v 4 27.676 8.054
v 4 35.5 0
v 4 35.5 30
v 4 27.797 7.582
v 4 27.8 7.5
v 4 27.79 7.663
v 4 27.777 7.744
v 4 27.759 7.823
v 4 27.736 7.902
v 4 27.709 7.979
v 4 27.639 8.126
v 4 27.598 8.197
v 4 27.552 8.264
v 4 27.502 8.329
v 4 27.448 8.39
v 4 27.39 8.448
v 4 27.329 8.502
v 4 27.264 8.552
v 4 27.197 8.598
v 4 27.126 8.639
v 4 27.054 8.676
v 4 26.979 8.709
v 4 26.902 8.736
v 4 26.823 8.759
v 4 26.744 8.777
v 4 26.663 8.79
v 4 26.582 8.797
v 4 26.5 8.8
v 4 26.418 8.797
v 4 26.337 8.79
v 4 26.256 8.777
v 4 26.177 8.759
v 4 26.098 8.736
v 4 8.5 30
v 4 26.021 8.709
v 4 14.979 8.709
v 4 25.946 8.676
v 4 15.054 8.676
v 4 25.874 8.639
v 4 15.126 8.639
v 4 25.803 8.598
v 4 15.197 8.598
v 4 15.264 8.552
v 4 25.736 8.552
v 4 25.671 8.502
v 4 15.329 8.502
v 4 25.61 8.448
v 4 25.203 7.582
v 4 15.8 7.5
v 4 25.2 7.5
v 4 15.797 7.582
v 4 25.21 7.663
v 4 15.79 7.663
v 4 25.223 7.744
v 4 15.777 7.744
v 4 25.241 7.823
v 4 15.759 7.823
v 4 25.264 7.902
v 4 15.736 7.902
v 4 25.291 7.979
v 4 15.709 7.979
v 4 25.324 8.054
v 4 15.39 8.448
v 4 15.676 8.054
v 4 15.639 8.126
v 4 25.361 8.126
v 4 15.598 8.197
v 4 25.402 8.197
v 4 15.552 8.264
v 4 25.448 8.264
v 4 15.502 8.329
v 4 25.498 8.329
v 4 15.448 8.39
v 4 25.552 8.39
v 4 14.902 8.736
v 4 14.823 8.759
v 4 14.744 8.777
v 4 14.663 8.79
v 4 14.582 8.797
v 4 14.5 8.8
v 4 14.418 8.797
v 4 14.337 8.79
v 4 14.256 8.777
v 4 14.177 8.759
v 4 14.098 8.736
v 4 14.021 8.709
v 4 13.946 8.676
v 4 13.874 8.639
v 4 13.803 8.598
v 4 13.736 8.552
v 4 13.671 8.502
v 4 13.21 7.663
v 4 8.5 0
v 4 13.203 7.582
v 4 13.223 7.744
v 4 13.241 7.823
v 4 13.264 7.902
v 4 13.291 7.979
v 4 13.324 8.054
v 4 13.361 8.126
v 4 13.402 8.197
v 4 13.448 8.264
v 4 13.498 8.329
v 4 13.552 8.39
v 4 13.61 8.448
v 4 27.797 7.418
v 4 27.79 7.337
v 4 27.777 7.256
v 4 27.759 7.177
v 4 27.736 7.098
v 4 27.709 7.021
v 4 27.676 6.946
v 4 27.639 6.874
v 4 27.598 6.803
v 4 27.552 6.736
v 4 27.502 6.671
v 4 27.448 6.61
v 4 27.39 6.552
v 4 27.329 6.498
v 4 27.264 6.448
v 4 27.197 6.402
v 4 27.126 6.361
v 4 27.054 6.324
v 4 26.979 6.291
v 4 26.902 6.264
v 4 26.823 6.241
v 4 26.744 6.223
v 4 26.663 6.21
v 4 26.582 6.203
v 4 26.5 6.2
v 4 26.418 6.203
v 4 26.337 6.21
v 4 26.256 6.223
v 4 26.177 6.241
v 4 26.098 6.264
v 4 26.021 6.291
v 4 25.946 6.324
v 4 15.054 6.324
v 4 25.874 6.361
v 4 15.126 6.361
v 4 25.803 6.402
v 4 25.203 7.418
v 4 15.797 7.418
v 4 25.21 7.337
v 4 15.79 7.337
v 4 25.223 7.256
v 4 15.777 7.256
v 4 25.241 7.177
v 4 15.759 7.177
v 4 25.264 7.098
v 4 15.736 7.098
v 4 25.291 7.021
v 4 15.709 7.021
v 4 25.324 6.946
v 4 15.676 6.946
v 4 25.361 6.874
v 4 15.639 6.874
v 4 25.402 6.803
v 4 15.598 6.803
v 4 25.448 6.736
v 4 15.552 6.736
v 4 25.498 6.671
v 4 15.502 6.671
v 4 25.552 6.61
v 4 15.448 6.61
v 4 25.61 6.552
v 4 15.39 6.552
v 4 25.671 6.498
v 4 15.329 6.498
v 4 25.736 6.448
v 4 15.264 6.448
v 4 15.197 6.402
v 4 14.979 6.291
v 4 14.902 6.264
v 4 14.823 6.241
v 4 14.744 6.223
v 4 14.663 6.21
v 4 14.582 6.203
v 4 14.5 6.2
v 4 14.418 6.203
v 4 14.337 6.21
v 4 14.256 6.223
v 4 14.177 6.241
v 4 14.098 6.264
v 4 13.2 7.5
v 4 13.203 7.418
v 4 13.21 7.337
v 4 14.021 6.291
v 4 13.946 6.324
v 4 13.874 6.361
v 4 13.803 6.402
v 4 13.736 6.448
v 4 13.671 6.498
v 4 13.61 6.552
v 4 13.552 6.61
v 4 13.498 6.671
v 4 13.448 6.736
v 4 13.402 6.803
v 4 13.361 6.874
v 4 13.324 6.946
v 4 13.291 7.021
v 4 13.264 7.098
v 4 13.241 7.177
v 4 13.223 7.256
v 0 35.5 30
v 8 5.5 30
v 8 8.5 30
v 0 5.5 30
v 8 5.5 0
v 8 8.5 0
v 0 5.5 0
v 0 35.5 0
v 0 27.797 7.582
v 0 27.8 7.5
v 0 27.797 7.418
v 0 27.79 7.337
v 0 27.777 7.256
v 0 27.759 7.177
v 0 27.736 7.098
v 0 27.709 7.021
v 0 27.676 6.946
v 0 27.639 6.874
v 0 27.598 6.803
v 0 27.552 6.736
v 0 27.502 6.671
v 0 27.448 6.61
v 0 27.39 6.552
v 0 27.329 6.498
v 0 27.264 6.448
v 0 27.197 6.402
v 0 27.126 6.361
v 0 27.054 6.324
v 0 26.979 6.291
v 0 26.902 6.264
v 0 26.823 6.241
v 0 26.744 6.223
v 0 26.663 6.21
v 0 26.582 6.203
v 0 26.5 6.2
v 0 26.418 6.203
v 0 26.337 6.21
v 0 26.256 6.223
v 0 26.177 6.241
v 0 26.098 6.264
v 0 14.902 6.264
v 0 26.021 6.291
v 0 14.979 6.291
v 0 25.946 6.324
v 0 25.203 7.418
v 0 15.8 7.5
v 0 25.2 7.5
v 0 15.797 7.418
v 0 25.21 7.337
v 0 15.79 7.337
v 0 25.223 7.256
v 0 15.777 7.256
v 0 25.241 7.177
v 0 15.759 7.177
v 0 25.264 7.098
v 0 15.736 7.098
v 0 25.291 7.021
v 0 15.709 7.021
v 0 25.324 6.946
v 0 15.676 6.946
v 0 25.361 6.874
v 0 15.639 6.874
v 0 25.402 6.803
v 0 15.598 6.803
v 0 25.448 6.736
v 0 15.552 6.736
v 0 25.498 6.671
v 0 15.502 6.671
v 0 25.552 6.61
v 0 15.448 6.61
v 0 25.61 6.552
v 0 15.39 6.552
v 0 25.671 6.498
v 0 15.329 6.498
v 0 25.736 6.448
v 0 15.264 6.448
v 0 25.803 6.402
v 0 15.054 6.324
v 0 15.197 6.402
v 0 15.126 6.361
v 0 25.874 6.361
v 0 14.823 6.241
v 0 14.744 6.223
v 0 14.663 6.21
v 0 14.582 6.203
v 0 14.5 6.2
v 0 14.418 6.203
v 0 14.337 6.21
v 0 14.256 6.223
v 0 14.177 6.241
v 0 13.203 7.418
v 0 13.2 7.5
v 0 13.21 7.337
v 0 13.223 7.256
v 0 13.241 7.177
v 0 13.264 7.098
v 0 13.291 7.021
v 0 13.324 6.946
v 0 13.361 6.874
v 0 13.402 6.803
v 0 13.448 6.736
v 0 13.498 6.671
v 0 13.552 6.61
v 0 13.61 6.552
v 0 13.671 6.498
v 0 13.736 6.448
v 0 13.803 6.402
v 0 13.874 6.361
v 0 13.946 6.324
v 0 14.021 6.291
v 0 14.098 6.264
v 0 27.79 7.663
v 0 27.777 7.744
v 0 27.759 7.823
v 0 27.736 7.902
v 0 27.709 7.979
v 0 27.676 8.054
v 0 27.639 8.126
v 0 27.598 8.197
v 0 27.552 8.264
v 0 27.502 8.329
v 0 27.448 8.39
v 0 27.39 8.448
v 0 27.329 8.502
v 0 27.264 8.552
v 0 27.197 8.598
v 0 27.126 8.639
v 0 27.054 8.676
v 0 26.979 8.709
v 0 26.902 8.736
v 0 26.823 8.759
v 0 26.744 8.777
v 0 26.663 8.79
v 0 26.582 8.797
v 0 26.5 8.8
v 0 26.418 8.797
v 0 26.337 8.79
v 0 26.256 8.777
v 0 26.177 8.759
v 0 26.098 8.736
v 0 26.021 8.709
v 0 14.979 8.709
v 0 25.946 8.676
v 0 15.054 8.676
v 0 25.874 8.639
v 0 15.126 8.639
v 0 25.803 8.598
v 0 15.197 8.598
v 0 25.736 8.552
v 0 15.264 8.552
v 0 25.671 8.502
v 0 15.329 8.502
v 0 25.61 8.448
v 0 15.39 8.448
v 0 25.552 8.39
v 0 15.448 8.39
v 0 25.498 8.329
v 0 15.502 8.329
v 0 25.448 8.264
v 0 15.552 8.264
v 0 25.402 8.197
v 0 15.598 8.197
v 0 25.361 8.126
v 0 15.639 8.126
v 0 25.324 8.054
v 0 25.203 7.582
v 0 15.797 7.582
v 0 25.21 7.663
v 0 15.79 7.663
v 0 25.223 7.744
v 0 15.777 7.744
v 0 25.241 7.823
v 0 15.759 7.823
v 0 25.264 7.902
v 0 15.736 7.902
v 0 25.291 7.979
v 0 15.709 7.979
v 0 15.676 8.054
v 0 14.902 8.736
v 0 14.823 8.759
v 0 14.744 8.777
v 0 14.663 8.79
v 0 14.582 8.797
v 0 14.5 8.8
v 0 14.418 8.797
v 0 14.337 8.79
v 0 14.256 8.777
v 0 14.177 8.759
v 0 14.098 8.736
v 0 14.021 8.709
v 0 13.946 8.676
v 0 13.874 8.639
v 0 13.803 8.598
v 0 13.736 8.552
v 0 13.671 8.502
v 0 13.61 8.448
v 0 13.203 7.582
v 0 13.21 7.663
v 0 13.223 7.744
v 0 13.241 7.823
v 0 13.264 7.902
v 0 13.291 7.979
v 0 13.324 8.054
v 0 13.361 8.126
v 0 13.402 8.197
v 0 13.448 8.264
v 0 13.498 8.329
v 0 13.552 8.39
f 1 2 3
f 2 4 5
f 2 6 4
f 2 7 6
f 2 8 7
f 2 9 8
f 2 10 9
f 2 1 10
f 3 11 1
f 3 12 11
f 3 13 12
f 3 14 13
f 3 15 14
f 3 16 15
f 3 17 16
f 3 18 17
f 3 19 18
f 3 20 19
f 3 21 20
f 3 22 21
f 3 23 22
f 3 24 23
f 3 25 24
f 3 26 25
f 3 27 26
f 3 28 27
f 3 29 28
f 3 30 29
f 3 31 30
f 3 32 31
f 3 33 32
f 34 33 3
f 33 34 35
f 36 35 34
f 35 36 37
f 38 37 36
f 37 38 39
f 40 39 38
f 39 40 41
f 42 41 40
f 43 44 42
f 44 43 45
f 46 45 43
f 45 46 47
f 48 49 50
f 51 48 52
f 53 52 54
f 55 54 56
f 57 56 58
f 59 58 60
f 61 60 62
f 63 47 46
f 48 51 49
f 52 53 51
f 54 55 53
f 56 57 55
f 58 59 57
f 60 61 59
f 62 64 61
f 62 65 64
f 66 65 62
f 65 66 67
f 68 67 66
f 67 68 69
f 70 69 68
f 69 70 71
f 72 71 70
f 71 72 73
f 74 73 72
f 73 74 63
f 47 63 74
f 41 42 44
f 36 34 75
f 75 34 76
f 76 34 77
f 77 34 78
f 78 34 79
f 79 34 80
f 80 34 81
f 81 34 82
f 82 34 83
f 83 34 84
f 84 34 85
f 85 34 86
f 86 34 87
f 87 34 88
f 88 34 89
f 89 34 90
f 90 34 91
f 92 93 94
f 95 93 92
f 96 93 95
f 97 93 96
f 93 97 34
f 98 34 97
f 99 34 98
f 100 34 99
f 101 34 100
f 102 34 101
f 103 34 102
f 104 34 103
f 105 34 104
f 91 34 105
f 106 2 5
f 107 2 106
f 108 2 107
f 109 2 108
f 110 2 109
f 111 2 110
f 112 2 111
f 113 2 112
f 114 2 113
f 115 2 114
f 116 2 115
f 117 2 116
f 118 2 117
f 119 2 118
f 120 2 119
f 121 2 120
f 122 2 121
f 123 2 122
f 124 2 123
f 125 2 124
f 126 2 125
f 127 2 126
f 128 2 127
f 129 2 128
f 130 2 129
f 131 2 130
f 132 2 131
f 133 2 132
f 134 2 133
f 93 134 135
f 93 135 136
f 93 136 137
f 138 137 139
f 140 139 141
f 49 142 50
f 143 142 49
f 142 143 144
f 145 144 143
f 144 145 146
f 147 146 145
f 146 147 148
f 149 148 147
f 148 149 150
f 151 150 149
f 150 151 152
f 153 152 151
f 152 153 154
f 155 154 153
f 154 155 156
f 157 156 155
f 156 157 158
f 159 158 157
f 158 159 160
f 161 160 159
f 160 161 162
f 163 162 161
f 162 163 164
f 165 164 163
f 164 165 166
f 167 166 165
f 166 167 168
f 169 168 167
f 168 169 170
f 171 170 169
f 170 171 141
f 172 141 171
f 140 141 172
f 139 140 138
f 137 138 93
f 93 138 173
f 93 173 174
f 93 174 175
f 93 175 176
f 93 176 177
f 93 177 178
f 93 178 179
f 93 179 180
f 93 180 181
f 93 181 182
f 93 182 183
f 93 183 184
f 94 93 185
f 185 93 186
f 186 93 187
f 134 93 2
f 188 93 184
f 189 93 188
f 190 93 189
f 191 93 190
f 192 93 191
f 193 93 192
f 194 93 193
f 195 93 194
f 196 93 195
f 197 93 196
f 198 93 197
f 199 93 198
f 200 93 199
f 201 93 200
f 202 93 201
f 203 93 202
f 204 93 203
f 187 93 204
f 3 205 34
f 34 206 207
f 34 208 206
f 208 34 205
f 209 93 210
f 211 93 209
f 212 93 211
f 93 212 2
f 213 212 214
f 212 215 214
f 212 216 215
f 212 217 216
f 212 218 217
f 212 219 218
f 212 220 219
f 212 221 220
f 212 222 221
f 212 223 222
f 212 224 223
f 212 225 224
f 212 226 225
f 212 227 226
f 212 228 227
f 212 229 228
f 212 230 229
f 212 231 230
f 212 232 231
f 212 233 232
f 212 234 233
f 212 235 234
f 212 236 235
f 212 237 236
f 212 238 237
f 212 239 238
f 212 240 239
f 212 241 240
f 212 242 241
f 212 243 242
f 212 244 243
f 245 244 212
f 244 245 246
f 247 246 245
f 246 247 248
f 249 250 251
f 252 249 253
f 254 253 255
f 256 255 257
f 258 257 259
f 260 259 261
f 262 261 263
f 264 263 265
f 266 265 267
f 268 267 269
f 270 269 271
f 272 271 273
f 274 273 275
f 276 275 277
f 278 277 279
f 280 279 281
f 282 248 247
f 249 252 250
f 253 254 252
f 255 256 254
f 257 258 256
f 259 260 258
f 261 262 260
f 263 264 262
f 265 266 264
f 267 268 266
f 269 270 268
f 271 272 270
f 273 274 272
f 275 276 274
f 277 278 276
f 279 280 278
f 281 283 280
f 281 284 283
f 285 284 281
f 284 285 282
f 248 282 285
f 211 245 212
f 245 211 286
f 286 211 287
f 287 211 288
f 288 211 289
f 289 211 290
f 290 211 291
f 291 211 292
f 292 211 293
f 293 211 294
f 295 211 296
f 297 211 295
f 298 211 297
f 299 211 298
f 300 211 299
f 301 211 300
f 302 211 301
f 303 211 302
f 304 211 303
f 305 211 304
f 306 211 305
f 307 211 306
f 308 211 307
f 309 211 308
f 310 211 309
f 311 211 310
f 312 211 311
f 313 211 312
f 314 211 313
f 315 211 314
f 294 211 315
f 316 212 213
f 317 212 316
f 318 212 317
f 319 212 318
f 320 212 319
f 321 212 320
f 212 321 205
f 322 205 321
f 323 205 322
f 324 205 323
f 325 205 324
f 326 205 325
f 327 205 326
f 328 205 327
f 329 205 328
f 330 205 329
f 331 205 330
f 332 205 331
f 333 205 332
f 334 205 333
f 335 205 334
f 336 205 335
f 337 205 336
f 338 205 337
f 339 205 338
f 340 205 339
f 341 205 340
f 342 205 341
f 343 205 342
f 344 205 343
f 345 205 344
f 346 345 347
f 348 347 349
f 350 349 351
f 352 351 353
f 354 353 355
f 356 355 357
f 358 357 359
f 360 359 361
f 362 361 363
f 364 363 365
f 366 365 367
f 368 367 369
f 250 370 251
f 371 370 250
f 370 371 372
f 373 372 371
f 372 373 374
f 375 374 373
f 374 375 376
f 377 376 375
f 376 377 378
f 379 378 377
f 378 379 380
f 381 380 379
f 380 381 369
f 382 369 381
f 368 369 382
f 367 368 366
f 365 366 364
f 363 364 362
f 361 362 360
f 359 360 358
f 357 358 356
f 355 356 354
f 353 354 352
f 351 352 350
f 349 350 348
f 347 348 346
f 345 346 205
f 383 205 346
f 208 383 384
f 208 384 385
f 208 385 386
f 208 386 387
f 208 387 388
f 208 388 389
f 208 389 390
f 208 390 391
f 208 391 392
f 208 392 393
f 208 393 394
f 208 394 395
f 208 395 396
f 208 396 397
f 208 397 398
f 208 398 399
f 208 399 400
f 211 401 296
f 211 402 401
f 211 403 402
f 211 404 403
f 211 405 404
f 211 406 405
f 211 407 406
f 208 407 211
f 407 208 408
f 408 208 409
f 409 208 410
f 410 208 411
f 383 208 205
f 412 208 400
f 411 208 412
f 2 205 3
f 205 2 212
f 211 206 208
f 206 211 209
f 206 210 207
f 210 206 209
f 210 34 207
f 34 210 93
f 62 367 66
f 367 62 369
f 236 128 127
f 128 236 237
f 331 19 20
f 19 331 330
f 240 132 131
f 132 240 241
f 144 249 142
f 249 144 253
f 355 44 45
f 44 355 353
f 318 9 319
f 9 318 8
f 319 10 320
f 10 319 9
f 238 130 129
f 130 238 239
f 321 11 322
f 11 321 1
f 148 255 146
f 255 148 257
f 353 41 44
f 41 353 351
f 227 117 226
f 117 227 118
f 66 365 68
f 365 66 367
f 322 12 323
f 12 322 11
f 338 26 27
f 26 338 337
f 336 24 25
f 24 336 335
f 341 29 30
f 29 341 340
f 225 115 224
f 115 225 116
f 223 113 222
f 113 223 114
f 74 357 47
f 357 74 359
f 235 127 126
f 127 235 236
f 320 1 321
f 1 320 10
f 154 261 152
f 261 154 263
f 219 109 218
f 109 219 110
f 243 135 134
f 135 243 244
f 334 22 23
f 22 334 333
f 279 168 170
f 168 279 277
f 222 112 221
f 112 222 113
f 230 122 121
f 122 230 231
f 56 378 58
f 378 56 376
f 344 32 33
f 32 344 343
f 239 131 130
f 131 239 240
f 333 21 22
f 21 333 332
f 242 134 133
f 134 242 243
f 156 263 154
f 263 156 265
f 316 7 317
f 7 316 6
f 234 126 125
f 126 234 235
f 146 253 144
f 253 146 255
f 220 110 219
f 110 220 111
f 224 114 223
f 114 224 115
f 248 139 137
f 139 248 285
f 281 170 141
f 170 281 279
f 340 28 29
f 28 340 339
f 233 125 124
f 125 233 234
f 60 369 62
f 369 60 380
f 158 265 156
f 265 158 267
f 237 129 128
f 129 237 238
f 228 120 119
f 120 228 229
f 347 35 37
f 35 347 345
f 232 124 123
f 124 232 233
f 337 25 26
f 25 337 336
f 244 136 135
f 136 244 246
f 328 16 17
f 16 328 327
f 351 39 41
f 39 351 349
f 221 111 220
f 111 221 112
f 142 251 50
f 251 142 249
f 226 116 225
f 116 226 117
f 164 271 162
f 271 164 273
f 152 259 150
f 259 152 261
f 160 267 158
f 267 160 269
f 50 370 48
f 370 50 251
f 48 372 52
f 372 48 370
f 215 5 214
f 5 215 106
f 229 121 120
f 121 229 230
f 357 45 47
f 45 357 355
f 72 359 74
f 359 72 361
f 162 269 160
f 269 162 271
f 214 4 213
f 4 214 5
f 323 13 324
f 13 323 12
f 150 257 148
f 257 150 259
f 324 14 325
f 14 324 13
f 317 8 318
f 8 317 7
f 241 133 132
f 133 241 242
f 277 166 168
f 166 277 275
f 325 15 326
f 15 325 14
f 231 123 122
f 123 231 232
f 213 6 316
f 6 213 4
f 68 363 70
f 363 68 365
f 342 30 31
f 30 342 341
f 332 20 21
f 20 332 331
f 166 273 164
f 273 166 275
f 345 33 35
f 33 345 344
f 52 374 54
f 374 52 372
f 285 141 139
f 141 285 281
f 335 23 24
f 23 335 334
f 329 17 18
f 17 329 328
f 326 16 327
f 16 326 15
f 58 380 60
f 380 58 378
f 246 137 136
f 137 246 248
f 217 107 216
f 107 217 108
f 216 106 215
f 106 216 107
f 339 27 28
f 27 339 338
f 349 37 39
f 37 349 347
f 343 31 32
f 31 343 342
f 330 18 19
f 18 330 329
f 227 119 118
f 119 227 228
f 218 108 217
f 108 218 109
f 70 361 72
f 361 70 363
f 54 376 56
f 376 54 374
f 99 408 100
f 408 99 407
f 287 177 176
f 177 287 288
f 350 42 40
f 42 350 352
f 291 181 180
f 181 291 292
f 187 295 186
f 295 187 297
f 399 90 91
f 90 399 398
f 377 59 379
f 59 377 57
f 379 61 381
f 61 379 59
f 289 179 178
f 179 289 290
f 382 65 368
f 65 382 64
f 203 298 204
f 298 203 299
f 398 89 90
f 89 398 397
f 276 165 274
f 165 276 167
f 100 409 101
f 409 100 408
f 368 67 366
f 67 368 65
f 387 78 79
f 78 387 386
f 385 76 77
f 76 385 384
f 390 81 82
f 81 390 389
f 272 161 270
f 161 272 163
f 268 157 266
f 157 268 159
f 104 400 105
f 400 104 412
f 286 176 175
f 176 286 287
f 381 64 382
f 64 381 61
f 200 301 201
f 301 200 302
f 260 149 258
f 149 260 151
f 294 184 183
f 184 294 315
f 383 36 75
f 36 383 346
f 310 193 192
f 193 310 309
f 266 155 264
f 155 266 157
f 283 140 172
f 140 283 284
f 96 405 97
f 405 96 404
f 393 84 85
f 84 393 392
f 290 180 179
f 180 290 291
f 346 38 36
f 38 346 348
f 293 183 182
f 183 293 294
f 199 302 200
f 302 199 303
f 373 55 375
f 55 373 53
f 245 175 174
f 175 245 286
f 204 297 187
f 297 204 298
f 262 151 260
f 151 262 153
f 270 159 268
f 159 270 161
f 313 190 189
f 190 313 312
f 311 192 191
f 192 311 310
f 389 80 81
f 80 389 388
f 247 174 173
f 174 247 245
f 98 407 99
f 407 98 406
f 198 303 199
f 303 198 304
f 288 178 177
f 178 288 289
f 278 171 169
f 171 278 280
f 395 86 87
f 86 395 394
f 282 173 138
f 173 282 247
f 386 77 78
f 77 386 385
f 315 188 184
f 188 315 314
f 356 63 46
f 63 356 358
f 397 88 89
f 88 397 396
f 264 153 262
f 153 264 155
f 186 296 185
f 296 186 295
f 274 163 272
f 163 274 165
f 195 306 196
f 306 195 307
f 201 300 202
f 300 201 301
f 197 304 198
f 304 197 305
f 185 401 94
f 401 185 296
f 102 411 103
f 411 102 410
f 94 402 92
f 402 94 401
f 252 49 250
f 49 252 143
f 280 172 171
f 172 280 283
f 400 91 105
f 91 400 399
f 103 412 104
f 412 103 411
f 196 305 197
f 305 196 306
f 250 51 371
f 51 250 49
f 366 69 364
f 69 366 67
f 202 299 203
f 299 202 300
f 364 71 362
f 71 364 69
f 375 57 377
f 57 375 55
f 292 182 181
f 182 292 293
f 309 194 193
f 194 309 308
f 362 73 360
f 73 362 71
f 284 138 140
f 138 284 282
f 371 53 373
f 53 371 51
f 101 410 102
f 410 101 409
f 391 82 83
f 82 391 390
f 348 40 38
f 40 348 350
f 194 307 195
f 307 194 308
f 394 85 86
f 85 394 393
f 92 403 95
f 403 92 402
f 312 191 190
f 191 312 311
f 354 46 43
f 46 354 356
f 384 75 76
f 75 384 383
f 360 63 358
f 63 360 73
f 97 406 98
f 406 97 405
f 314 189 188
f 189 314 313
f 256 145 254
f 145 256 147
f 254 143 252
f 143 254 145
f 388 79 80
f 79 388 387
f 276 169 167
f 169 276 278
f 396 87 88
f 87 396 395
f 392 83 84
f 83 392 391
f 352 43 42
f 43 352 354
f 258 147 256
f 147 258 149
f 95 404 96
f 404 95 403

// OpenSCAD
difference(){
	union(){
        
       translate([0,5.5,0]){
           cube([4,30,30], center=false);
       }
       translate([0,5.5,0]){
           cube([8,3,30], center=false);
       }


	}
	union() {

       translate([-10,41/2+6,7.5]){
            rotate(a = [0,90,0]) {
              cylinder(h=600, r=1.3, $fn=100, center=false);
            }
       }	
       translate([-10,41/2-6,7.5]){
            rotate(a = [0,90,0]) {
              cylinder(h=600, r=1.3, $fn=100, center=false);
            }
       }	

        
	}
}
